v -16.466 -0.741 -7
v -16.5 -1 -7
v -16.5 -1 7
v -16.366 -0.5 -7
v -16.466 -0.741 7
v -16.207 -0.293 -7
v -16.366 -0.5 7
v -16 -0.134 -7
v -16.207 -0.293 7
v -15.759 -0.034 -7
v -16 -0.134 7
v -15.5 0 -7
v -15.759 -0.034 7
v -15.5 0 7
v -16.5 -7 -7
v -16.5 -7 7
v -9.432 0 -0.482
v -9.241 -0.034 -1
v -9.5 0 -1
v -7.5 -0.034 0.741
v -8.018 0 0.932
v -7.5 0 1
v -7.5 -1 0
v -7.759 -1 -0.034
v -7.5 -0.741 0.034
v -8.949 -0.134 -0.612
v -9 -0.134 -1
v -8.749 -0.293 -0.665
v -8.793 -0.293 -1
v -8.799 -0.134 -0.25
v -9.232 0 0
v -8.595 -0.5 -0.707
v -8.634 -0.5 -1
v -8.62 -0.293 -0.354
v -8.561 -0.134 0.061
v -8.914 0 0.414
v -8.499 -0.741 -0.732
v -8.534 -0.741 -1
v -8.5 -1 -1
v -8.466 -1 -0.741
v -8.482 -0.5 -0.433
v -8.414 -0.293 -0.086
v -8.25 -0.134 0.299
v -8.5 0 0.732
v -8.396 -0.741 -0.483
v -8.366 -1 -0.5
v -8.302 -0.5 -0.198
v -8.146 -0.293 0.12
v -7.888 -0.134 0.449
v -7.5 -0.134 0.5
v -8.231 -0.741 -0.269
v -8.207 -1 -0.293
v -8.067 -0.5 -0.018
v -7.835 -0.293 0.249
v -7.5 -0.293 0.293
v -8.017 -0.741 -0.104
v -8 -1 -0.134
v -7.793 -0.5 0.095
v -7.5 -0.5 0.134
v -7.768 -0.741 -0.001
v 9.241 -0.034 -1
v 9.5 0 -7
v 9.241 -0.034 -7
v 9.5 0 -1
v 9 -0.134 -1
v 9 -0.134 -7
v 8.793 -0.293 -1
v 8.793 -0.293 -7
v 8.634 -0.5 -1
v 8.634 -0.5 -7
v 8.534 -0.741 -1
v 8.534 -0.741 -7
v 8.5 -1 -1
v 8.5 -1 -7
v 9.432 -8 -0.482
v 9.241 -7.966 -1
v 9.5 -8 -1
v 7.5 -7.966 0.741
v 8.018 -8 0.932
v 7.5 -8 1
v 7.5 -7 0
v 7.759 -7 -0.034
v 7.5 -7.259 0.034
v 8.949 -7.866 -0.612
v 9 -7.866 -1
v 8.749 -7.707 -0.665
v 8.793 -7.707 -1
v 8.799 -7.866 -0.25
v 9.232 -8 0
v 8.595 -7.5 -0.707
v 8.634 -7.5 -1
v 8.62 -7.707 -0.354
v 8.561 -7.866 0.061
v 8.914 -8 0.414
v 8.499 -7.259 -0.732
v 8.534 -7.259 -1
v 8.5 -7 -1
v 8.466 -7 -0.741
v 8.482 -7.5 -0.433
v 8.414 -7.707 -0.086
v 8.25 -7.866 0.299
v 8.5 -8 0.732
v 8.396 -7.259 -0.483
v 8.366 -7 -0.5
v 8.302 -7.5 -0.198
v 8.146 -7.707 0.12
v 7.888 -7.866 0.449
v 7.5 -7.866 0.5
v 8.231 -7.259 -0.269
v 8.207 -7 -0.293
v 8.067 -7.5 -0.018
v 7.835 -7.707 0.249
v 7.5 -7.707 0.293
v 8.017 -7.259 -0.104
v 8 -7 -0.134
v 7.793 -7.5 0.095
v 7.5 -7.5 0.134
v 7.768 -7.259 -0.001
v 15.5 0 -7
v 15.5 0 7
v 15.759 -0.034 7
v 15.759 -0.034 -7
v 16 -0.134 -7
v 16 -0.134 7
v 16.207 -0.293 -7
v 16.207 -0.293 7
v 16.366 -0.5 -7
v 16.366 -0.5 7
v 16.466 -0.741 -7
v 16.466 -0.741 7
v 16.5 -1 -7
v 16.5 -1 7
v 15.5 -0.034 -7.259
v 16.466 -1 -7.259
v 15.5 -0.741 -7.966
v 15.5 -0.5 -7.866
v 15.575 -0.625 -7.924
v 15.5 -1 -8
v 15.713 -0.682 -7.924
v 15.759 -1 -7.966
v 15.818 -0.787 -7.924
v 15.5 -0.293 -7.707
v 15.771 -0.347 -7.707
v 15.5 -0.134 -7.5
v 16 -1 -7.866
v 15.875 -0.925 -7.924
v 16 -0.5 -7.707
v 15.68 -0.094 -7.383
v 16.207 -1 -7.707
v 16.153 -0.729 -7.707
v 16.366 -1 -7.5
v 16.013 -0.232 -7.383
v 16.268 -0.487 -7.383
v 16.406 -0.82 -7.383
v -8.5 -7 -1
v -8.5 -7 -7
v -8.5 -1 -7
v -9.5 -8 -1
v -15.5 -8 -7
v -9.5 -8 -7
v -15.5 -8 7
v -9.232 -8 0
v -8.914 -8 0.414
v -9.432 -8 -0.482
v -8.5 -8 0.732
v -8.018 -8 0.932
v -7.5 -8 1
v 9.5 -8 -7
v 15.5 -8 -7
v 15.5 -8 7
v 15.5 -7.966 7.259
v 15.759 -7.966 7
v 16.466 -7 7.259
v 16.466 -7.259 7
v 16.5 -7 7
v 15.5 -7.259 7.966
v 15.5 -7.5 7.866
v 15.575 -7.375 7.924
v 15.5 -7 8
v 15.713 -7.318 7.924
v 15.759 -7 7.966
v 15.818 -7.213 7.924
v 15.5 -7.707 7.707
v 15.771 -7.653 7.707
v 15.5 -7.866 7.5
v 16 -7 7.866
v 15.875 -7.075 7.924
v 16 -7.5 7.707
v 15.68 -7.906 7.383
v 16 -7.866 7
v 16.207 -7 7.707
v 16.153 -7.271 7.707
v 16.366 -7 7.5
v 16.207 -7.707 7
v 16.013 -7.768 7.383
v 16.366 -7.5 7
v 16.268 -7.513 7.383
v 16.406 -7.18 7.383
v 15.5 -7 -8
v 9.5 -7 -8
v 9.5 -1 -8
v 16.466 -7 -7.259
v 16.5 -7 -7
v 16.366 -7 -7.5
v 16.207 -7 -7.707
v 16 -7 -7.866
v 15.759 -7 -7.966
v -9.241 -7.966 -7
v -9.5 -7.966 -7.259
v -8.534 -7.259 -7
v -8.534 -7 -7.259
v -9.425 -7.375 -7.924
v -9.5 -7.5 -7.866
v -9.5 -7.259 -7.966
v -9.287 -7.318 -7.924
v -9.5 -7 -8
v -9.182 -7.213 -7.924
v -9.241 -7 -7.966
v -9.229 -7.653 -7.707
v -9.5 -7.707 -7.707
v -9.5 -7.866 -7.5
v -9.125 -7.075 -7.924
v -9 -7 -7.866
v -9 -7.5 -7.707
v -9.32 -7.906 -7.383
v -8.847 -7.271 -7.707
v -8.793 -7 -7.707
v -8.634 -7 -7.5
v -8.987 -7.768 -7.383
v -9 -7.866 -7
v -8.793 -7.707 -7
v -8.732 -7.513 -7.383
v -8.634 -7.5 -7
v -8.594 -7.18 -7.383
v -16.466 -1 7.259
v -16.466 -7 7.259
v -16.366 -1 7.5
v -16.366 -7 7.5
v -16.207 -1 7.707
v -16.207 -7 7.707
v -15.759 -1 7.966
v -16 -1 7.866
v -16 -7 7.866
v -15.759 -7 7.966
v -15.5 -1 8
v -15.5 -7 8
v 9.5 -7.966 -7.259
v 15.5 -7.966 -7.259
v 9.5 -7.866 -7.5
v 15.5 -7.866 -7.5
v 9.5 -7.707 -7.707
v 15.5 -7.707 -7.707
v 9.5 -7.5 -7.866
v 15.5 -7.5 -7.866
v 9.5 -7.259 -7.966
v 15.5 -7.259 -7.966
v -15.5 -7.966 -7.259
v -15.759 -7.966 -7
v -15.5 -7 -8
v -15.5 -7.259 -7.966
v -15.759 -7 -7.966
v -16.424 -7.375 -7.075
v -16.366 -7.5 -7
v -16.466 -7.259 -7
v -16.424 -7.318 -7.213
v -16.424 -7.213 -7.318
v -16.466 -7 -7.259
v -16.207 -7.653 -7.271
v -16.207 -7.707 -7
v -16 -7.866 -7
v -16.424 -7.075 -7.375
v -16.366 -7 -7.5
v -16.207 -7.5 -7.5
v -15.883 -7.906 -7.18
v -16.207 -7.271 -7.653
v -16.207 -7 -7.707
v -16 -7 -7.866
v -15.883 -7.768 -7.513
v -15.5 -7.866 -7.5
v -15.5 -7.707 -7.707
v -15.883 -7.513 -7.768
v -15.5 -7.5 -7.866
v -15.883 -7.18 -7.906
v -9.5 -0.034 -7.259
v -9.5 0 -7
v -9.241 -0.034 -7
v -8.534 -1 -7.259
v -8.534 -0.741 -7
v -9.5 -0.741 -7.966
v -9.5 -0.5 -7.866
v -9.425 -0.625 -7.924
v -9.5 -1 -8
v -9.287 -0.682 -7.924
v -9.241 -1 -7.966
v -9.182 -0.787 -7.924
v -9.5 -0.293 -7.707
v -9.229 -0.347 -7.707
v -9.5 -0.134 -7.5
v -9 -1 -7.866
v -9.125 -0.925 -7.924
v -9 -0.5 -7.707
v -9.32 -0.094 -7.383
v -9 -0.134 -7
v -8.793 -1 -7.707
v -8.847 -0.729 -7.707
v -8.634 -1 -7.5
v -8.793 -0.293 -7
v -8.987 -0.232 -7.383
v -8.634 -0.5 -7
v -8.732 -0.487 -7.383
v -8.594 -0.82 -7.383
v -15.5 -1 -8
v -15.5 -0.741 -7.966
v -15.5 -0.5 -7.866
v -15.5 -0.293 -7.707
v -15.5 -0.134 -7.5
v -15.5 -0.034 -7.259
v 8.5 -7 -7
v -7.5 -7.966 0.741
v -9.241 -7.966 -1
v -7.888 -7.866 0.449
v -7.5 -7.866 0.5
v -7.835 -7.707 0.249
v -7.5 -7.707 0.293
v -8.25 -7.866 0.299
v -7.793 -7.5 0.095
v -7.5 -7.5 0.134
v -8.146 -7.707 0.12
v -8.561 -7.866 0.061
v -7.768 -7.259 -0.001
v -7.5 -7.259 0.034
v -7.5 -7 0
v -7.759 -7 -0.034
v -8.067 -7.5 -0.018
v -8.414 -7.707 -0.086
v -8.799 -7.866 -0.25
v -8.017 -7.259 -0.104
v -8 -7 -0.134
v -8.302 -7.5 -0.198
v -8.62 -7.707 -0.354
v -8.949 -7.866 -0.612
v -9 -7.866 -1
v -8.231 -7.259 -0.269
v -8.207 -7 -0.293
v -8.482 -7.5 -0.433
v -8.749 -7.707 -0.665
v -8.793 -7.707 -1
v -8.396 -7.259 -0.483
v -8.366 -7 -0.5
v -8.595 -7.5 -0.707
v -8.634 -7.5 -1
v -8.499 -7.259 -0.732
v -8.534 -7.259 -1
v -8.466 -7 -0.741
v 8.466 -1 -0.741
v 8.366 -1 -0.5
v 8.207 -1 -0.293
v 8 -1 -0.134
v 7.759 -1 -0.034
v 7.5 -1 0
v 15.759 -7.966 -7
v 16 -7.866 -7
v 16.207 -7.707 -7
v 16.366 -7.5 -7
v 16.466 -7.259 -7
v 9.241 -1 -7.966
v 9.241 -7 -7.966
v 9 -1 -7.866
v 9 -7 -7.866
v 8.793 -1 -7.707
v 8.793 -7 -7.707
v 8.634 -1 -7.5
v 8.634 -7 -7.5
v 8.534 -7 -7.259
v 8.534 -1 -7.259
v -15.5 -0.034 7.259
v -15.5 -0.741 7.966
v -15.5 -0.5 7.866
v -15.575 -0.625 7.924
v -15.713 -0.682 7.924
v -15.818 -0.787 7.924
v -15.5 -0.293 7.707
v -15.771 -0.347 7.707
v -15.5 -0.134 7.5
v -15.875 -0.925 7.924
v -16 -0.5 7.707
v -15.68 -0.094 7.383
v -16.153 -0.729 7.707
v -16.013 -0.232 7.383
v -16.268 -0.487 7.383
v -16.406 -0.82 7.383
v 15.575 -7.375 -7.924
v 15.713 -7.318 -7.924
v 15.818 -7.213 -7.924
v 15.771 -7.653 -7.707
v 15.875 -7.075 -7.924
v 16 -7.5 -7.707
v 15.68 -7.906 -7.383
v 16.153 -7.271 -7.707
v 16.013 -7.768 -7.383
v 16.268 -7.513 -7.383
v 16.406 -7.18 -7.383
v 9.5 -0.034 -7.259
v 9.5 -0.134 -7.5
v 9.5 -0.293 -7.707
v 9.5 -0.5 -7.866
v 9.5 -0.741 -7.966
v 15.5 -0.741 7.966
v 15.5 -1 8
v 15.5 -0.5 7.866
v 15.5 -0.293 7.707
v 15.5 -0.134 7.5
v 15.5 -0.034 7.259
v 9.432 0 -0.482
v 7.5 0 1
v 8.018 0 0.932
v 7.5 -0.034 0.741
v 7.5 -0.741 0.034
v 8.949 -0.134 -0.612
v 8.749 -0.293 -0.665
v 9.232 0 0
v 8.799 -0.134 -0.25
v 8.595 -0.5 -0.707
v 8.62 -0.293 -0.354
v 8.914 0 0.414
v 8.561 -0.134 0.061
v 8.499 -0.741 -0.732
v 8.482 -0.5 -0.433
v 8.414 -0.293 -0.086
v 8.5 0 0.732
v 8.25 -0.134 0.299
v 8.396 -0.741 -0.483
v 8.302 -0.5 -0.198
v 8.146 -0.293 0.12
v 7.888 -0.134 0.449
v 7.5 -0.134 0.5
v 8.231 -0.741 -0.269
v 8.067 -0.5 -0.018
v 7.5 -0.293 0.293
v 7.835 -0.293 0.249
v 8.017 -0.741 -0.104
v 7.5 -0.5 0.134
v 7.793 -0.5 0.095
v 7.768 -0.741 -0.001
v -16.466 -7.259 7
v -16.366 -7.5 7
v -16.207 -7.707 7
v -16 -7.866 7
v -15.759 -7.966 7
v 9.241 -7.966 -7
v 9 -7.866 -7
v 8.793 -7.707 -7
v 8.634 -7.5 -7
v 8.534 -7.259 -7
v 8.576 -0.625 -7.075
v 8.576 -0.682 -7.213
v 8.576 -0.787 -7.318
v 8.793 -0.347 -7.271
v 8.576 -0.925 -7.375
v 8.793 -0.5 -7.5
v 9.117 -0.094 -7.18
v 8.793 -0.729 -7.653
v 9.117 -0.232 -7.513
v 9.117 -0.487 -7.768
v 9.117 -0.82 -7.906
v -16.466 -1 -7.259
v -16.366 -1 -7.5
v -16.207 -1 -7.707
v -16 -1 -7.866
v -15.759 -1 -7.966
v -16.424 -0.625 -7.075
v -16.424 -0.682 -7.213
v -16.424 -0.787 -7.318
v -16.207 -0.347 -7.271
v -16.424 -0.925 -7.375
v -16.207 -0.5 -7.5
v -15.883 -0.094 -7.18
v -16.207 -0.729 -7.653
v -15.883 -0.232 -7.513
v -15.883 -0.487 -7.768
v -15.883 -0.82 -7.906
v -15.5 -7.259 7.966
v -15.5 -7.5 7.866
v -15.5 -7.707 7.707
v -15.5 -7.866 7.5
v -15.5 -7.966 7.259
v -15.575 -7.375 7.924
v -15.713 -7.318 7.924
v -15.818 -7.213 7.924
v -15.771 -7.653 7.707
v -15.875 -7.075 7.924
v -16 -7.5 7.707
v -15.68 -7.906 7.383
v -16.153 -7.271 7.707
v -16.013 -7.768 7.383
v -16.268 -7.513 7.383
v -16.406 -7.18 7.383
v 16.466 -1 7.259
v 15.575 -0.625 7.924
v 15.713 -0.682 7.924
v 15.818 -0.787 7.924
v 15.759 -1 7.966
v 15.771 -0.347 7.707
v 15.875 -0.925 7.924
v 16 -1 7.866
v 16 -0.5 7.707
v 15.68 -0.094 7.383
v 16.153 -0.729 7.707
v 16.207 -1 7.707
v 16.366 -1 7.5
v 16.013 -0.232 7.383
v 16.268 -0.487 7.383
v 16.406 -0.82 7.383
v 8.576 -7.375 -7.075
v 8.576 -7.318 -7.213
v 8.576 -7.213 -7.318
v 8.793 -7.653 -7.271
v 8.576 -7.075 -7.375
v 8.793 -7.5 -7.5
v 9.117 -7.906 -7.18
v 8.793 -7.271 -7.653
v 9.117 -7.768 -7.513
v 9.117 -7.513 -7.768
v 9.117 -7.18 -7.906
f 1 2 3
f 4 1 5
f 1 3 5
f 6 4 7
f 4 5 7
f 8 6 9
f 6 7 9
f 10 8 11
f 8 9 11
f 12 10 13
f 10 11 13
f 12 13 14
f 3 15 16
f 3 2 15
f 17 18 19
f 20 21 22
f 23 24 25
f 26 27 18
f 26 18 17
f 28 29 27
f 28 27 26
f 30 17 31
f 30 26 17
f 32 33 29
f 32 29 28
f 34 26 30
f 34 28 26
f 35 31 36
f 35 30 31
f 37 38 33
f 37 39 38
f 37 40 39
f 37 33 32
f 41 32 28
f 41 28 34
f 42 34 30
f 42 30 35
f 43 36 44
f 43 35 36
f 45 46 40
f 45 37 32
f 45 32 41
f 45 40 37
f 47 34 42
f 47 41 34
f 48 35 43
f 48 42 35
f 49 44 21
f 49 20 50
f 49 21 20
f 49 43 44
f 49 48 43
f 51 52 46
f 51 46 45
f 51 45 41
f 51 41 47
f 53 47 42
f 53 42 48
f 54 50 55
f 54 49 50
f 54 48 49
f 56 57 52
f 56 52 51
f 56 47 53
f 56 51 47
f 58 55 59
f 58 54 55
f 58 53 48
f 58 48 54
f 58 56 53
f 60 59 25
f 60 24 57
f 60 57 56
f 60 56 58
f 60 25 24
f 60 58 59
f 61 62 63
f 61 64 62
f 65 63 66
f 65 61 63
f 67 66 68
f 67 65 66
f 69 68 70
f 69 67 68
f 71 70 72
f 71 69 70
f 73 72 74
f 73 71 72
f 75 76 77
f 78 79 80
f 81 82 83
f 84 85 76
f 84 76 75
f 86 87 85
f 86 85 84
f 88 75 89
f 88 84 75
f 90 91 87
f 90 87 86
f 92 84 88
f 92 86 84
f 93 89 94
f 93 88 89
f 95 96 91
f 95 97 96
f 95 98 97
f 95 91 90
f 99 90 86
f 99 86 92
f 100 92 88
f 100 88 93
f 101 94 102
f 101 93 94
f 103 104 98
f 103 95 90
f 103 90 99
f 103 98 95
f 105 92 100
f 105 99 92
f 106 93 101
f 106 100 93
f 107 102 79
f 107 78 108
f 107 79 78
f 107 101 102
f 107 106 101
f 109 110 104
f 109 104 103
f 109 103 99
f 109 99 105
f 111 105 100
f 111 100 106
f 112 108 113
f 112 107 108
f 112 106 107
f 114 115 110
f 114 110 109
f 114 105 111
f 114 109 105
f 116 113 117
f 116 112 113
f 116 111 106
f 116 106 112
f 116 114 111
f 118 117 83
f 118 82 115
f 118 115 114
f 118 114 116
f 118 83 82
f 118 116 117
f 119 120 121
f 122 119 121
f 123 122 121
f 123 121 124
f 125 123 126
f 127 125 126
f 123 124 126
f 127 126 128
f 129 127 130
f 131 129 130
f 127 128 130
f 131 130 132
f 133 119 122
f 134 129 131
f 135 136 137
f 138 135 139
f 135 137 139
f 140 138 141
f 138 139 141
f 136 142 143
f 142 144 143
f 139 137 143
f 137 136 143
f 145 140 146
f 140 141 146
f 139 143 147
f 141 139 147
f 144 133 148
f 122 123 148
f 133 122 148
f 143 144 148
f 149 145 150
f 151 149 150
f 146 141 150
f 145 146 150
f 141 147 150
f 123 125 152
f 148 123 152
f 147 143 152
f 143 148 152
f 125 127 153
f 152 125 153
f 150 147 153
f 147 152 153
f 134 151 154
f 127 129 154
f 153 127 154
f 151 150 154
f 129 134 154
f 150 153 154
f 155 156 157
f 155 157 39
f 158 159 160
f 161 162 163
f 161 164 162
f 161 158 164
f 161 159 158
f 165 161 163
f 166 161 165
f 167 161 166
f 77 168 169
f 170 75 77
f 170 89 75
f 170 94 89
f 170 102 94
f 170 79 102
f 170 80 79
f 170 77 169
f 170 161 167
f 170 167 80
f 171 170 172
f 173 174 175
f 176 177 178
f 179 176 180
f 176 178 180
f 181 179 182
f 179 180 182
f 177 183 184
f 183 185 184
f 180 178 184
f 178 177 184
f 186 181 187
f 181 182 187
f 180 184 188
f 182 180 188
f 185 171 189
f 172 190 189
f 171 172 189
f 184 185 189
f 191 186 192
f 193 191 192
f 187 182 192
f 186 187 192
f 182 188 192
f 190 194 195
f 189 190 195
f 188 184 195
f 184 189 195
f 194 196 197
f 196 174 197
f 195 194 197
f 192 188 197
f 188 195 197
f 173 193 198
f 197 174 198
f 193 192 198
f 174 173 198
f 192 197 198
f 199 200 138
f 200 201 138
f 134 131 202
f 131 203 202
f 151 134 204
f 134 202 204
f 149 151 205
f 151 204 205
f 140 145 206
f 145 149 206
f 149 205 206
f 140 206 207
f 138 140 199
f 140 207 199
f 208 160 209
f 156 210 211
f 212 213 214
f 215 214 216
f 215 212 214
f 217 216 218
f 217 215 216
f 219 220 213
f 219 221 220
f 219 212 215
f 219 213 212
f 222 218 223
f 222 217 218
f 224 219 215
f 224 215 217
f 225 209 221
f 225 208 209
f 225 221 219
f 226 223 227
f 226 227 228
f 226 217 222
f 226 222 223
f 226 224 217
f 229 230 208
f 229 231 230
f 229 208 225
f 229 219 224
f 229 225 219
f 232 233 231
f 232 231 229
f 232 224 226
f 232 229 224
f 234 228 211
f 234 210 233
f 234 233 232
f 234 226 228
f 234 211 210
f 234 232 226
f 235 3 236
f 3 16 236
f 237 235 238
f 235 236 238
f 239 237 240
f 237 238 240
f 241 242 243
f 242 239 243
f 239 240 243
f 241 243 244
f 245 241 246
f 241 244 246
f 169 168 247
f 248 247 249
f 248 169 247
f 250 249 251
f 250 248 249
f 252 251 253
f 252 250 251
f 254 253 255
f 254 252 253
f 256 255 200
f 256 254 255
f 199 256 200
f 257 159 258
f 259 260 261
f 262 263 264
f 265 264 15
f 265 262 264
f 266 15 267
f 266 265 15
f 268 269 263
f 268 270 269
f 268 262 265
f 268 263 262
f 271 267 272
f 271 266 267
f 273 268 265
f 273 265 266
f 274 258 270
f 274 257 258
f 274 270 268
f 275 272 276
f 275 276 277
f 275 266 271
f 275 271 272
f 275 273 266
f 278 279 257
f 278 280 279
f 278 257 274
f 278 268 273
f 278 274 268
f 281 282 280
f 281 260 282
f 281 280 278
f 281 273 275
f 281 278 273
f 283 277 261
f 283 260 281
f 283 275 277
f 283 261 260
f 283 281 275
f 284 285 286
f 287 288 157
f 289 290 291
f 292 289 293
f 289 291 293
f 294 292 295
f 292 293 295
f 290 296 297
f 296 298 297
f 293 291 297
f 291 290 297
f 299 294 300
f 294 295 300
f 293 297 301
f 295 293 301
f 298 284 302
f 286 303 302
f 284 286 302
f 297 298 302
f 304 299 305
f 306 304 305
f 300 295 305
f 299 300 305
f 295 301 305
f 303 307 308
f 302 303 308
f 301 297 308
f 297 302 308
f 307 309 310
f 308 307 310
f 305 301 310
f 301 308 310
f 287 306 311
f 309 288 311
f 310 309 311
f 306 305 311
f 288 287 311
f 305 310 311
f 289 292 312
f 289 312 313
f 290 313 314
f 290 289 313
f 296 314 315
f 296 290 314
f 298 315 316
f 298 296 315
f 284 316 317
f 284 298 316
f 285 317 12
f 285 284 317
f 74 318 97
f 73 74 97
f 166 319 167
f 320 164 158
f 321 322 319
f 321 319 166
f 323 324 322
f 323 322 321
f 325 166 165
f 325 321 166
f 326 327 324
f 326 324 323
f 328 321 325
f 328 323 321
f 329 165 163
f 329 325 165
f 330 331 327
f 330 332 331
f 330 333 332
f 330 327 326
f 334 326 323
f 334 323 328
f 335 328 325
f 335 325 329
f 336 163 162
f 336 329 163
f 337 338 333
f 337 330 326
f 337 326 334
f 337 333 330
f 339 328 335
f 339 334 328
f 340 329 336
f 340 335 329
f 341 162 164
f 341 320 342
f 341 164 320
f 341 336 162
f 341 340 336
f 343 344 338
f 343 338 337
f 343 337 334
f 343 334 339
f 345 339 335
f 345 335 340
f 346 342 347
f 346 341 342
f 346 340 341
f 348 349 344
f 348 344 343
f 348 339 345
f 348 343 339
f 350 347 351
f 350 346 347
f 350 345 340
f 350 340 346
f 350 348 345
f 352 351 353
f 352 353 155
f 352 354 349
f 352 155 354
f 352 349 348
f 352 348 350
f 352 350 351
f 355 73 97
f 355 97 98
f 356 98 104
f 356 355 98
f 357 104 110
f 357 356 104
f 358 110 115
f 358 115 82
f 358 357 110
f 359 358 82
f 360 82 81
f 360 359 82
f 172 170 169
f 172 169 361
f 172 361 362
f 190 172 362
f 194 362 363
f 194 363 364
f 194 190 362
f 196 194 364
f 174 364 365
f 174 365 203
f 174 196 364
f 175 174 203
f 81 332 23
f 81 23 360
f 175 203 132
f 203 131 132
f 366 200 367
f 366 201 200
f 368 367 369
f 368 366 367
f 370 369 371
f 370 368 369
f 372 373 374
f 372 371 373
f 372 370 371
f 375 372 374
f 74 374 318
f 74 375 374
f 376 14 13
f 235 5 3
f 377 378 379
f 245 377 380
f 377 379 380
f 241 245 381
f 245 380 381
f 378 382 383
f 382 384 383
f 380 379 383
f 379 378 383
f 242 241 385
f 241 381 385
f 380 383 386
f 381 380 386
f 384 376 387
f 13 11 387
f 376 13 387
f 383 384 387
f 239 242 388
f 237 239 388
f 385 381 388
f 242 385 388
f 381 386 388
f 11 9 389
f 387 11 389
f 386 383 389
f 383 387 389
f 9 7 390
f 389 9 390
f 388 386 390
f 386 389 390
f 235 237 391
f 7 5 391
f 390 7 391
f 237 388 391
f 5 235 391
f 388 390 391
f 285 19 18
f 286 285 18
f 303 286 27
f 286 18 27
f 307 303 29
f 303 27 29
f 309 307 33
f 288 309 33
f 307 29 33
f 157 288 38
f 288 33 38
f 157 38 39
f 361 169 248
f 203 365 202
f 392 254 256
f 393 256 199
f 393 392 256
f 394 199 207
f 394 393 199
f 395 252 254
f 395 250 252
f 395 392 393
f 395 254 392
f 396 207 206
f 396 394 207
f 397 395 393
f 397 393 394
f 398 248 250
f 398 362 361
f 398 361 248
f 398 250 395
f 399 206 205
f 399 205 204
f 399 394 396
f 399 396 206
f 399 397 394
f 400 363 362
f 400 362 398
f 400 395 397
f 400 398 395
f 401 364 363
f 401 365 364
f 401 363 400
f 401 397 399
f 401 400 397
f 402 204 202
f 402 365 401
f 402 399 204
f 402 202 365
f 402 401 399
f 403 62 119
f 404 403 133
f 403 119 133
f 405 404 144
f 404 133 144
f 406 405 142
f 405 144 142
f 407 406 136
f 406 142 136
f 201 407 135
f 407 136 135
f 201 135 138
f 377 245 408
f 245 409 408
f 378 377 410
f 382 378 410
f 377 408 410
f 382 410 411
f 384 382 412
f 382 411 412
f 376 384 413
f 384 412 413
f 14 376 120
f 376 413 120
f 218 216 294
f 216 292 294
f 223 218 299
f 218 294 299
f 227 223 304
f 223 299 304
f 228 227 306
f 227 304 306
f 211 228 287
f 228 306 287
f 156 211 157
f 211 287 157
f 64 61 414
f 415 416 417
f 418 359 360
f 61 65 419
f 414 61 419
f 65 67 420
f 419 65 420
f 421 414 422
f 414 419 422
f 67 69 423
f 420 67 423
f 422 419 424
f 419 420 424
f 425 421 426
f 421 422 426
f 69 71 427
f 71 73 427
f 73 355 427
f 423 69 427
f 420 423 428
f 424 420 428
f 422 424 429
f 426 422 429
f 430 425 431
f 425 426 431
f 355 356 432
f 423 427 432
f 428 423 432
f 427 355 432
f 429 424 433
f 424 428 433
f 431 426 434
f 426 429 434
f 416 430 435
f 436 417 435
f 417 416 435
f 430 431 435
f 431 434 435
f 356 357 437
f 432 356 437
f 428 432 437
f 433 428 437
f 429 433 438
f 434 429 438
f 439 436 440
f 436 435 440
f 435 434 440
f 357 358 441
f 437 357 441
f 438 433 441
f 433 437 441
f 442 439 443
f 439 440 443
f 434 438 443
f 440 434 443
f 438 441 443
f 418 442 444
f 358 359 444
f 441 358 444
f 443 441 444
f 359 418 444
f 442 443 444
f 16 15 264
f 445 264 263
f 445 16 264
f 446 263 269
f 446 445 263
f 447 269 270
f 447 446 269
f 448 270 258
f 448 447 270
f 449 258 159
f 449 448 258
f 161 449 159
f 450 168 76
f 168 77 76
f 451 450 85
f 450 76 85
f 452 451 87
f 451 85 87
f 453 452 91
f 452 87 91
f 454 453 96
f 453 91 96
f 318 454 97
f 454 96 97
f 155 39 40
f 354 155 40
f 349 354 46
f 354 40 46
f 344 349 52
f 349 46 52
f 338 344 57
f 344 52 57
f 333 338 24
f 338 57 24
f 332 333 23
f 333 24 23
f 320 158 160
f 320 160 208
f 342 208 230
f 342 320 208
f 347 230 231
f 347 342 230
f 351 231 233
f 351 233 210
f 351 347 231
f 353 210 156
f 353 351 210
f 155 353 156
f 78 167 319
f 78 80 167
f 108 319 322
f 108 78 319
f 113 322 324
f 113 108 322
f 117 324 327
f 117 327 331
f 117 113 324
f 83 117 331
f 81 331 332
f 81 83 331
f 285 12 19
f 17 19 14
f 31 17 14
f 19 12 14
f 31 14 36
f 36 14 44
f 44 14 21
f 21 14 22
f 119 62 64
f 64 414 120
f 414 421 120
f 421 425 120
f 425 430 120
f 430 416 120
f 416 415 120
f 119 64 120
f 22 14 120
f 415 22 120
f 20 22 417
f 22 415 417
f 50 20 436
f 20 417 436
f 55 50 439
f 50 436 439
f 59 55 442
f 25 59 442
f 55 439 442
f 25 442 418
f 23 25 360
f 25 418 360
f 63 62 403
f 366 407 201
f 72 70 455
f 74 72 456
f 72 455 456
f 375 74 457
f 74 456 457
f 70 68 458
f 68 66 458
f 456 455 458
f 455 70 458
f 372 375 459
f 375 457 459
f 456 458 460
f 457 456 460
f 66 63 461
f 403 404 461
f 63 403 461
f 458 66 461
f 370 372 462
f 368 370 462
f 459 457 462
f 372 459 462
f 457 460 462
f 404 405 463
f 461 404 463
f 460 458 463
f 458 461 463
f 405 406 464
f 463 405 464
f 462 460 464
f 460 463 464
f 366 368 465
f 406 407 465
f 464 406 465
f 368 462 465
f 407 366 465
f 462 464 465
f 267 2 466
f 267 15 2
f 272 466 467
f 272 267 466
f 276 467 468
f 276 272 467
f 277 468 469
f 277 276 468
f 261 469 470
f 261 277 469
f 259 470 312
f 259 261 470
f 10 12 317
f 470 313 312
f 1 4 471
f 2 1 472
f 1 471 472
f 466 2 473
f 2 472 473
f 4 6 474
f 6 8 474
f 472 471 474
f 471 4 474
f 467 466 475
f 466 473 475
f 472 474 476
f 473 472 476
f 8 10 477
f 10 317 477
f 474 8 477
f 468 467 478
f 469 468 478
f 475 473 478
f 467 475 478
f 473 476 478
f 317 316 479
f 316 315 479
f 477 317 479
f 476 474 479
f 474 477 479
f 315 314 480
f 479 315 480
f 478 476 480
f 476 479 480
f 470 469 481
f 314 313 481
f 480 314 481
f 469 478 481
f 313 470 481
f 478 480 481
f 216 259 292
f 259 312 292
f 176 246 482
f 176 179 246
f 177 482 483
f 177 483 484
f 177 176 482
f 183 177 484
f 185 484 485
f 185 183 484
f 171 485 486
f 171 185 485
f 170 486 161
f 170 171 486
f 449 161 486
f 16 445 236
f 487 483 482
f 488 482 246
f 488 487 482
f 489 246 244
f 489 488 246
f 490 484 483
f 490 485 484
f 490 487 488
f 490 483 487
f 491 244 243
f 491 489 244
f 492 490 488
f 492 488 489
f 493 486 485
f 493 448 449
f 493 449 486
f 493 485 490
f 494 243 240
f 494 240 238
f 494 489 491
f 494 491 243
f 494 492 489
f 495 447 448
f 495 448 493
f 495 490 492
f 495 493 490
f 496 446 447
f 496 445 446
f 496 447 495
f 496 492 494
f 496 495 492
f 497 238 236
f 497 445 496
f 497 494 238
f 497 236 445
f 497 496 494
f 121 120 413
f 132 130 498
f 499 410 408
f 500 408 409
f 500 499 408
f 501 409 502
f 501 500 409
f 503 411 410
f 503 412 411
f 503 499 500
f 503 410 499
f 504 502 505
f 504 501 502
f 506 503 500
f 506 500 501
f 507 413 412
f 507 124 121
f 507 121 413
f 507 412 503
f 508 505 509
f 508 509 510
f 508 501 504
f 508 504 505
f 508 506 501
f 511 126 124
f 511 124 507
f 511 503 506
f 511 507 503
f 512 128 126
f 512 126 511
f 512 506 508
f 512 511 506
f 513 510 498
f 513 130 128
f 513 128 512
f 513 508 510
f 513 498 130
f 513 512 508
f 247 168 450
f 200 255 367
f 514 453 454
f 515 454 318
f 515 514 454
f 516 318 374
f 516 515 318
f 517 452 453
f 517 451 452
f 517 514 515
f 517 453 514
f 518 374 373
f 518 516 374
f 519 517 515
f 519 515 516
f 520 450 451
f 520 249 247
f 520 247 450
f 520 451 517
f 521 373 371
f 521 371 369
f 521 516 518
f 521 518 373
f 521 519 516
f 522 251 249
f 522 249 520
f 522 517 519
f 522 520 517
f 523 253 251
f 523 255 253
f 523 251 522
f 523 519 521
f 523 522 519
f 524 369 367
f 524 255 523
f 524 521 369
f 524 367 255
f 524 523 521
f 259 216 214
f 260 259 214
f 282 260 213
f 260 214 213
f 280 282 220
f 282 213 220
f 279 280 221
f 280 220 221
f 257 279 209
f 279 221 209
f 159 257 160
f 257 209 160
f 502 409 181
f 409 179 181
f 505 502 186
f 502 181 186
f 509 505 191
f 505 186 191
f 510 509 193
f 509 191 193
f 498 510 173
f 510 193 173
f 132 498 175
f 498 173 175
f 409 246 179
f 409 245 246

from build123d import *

# Parameters (mm, degrees)
F0_W     = 33
F0_H     = 16
F1_DEPTH = 8
F2_W     = 17
F2_H     = 8
F3_DEPTH = 25
F4_R     = 1


with BuildPart() as f1:
    # F0 (on Front) → F1 (new body)
    with BuildSketch(Plane.XZ):
        Rectangle(F0_W, F0_H)
    extrude(amount=F1_DEPTH)

    # F2 (on face) → F3 (cut)
    with BuildSketch(Plane.XZ.offset(8)):
        with Locations((0, -4)):
            Rectangle(F2_W, F2_H)
    extrude(amount=-F3_DEPTH, mode=Mode.SUBTRACT)

    # F4
    f4_edges = [f1.edges().sort_by_distance(p)[0] for p in [
        (16.5, -8, 0),
        (12.5, -8, -8),
        (8.5, -8, -4),
        (0, -8, 0),
        (-8.5, -8, -4),
        (-12.5, -8, -8),
        (-16.5, -8, 0),
        (0, -8, 8),
        (-8.5, 0, -4),
        (16.5, 0, 0),
        (12.5, 0, -8),
        (8.5, 0, -4),
        (0, 0, 0),
        (-12.5, 0, -8),
        (-16.5, 0, 0),
        (0, 0, 8),
        (-8.5, -4, 0),
        (8.5, -4, 0),
        (-8.5, -4, -8),
        (-16.5, -4, -8),
        (16.5, -4, -8),
        (8.5, -4, -8),
        (16.5, -4, 8),
        (-16.5, -4, 8),
    ]]
    fillet(f4_edges, radius=F4_R)


solid = f1.part
